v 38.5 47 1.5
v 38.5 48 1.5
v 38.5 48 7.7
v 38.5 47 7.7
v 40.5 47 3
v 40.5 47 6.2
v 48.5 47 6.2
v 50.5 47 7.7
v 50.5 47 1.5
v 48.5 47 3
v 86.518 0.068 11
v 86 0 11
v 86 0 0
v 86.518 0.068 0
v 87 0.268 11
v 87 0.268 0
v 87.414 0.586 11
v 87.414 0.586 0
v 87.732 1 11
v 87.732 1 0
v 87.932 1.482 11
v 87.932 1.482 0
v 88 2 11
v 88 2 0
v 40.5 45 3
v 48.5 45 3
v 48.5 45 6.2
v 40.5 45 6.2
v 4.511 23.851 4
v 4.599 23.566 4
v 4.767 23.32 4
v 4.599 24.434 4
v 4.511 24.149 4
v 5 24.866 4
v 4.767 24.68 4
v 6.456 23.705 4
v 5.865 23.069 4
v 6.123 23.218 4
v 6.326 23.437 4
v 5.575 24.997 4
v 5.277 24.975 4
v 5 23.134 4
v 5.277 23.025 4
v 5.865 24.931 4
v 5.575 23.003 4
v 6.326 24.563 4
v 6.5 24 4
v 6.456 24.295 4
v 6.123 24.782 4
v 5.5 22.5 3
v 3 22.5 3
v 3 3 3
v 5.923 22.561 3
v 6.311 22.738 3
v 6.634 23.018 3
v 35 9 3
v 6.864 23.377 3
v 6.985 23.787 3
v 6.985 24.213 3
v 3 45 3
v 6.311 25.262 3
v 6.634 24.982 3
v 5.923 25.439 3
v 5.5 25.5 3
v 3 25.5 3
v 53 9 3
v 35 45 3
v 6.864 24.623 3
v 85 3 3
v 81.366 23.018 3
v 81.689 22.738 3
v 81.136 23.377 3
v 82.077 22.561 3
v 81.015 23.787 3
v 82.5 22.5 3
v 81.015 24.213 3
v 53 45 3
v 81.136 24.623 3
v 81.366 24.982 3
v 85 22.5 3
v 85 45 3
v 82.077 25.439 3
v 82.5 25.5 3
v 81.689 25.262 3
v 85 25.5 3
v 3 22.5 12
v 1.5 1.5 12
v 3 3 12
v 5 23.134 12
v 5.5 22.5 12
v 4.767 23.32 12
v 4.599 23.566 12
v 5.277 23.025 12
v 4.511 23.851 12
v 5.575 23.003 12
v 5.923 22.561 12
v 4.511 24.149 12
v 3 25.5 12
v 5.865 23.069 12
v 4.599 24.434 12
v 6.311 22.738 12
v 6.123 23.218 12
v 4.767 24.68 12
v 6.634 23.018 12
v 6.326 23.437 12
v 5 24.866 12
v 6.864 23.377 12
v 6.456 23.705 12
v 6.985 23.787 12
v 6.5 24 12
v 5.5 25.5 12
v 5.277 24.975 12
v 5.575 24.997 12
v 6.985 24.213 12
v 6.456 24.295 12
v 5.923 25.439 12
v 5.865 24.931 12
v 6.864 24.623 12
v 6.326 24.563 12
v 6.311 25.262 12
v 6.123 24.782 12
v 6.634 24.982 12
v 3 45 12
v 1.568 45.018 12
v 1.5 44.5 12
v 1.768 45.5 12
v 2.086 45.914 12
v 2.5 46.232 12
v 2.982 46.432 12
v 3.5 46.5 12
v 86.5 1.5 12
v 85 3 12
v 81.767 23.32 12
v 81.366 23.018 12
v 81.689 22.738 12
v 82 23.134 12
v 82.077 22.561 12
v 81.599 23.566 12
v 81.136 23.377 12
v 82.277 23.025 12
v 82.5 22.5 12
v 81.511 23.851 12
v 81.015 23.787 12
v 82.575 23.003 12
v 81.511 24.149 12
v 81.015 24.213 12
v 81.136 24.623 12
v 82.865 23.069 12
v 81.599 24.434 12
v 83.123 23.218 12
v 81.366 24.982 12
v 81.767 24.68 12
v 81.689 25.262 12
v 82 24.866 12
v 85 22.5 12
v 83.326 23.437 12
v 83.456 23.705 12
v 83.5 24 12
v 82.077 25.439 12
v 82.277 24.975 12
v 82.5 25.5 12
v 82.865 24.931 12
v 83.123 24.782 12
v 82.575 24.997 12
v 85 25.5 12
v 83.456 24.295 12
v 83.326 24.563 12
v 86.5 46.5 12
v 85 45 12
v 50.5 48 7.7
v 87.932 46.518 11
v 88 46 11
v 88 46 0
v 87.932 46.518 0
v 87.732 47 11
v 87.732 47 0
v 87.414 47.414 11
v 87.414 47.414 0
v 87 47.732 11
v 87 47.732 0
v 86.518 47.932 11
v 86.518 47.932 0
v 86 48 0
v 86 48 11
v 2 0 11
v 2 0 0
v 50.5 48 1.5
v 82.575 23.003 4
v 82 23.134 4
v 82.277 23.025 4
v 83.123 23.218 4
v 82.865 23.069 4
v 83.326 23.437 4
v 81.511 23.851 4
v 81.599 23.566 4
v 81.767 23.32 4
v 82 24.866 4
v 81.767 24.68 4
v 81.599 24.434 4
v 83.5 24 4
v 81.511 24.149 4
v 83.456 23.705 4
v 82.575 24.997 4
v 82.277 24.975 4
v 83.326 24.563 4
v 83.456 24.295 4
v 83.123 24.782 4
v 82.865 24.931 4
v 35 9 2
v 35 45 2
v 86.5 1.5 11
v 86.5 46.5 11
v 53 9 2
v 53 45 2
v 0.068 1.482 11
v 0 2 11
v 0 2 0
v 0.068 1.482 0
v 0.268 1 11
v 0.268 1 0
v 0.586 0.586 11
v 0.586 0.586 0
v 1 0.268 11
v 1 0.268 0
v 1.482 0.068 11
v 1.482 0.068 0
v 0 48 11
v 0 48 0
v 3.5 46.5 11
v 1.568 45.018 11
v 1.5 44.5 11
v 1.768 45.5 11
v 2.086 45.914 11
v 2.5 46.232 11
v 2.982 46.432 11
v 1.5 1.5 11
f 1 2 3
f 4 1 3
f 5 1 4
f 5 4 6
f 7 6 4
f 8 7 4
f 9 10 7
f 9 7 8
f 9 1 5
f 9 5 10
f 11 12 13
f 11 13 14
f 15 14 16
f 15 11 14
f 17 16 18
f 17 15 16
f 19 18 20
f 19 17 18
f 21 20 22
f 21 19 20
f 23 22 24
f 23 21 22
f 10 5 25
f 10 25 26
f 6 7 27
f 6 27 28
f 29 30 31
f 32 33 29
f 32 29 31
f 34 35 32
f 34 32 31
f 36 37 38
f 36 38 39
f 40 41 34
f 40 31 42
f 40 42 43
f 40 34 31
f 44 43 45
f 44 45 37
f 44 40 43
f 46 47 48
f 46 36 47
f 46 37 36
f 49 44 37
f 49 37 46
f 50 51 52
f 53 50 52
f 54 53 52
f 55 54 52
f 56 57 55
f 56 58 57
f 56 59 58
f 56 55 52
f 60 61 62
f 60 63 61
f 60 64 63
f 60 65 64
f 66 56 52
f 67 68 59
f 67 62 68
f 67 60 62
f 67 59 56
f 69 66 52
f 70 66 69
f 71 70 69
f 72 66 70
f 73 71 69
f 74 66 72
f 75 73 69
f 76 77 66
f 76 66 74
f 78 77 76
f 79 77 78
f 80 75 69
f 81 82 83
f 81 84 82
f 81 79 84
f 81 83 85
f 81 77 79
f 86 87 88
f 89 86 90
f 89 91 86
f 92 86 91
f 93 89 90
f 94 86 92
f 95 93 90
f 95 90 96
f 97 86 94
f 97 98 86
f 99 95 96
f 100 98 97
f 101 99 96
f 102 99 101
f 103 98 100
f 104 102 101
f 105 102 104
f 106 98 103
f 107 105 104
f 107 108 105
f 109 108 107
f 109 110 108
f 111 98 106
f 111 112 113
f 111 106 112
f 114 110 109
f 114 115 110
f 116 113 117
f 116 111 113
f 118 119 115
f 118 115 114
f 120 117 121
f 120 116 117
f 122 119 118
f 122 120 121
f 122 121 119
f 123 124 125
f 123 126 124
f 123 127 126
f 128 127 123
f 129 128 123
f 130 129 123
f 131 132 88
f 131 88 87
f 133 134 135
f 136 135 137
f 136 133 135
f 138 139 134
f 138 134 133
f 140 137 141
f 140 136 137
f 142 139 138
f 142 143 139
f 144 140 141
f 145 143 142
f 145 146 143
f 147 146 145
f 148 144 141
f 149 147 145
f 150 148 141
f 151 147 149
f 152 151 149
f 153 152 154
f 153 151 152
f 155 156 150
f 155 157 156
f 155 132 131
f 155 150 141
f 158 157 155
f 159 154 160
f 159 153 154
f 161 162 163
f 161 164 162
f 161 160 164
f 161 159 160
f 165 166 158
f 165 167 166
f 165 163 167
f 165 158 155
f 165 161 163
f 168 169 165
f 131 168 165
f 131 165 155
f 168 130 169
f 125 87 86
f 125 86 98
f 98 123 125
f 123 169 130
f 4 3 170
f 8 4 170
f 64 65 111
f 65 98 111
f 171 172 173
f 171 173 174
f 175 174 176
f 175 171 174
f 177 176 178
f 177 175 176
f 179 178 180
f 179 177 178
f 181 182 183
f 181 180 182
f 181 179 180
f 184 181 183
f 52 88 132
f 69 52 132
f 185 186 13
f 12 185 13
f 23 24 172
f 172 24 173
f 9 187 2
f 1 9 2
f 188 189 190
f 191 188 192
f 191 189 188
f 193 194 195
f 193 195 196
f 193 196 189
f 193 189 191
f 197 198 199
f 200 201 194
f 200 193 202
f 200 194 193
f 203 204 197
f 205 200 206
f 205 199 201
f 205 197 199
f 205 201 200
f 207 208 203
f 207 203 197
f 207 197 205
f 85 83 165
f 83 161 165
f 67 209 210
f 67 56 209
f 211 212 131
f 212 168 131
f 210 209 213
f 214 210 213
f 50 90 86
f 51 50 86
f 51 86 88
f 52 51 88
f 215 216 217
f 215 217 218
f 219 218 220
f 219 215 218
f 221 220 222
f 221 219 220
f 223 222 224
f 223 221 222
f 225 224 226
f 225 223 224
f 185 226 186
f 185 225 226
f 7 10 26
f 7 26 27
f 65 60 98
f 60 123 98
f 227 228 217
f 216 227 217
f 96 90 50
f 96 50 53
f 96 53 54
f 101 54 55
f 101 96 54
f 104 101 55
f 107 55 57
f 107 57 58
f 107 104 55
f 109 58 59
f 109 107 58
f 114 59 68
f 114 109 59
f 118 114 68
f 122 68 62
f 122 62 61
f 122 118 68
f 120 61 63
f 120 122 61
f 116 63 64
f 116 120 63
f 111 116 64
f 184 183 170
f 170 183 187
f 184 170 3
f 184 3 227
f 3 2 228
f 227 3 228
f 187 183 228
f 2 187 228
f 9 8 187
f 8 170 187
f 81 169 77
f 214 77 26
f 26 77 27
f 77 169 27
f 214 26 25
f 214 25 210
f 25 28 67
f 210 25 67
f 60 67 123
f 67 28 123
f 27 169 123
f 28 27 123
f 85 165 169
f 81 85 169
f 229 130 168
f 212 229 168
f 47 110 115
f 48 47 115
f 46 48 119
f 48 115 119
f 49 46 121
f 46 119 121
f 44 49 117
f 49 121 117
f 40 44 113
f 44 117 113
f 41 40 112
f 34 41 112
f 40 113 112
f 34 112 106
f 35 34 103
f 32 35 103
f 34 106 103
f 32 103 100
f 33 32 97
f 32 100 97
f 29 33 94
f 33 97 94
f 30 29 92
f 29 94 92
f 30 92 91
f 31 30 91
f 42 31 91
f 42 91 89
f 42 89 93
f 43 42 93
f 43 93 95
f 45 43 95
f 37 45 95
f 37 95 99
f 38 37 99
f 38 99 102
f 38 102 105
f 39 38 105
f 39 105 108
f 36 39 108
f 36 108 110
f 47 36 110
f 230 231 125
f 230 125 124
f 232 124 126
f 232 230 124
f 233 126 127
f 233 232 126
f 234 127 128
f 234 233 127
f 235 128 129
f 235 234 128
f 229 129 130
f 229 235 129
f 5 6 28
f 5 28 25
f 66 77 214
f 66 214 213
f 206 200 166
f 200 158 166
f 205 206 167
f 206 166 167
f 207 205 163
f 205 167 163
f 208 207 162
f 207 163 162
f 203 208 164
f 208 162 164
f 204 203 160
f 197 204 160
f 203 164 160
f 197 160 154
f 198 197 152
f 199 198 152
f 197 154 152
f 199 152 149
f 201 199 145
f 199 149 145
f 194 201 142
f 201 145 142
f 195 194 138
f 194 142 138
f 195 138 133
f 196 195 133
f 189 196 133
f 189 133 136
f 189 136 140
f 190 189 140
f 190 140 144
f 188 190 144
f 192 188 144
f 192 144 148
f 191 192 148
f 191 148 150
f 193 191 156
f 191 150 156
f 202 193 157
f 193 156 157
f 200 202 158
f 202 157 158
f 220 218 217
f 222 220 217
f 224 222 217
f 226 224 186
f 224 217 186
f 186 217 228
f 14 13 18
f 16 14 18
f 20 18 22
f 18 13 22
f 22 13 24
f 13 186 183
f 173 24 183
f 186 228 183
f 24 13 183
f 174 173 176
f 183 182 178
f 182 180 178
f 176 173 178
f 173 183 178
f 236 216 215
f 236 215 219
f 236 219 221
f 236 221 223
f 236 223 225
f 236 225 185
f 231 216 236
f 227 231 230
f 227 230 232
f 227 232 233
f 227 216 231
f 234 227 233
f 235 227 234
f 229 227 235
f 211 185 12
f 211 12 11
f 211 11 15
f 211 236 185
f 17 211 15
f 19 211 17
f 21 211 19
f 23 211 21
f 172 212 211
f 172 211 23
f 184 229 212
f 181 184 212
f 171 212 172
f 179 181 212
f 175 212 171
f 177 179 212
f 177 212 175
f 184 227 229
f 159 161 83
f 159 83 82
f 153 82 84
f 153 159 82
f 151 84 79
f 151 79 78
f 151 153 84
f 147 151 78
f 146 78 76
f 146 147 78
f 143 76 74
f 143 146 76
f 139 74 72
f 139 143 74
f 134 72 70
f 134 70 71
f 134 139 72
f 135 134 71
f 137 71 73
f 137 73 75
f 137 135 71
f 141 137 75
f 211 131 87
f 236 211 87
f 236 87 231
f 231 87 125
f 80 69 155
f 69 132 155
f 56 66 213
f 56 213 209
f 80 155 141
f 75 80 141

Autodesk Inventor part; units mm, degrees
ref_plane "YZ Plane" through (0, 0, 0) normal (1, 0, 0) x (0, 1, 0)
ref_plane "XZ Plane" through (0, 0, 0) normal (0, 1, 0) x (-1, 0, 0)
ref_plane "XY Plane" through (0, 0, 0) normal (0, 0, 1) x (1, 0, 0)
sketch "Sketch1" plane through (0, 0, 0) normal (0, 0, 1) x (1, 0, 0)
  line L0 (0, 0) -> (88, 0)
  line L1 (88, 0) -> (88, 48)
  line L2 (88, 48) -> (0, 48)
  line L3 (0, 48) -> (0, 0)
  line L4 (18.3534, 5.6399) -> (66.0026, 5.6399)
  line L5 (66.0026, 5.6399) -> (66.0026, 36.8949)
  line L6 (66.0026, 36.8949) -> (18.3534, 36.8949)
  line L7 (18.3534, 36.8949) -> (18.3534, 5.6399)
  dimension "d0" = 88
  dimension "d1" = 48
extrude "Extrusion1" add sketch "Sketch1" along normal blind 12 contours L3 L2 L1 L0 | L7 L6 L5 L4
sketch "Sketch2" plane through (0, 0, 12) normal (0, 0, 1) x (1, 0, 0)
  line L0 (3, 3) -> (85, 3)
  line L1 (85, 3) -> (85, 45)
  line L2 (85, 45) -> (3, 45)
  line L3 (3, 45) -> (3, 3)
  line L4 (88, 48) -> (0, 48) projected
  line L5 (88, 0) -> (88, 48) projected
  line L6 (0, 0) -> (88, 0) projected
  line L7 (0, 48) -> (0, 0) projected
  dimension "d4" = 3
  dimension "d5" = 3
  dimension "d6" = 3
  dimension "d7" = 3
extrude "Extrusion2" cut sketch "Sketch2" against normal blind 9 contours L3 L2 L1 L0
sketch "Sketch3" plane through (0, 0, 12) normal (0, 0, 1) x (1, 0, 0)
  line L0 (1.5, 46.5) -> (86.5, 46.5)
  line L1 (86.5, 46.5) -> (86.5, 1.5)
  line L2 (86.5, 1.5) -> (1.5, 1.5)
  line L3 (1.5, 1.5) -> (1.5, 46.5)
  line L4 (0, 0) -> (88, 0) projected
  line L5 (0, 48) -> (0, 0) projected
  line L6 (88, 0) -> (0, 0)
  line L7 (0, 0) -> (0, 48)
  line L8 (0, 48) -> (88, 48)
  line L9 (88, 48) -> (88, 0)
  dimension "d10" = 1.5
  dimension "d11" = 1.5
  dimension "d12" = 1.5
  dimension "d13" = 1.5
extrude "Extrusion3" cut sketch "Sketch3" against normal blind 1
fillet "Fillet1" radius 2 4 edges at (0, 0, 5.5) (88, 0, 5.5) (88, 48, 5.5) (1.5, 46.5, 11.5)
sketch "Sketch4" plane through (0, 0, 12) normal (0, 0, 1) x (1, 0, 0)
  circle A0 centre (5.5, 24) radius 1
  circle A1 centre (82.5, 24) radius 1
  line L0 (3, 45) -> (85, 45) projected
  line L1 (3, 3) -> (3, 45) projected
  line L2 (3, 25.5) -> (5.5, 25.5)
  line L3 (5.5, 25.5) -> (5.5, 22.5)
  line L4 (5.5, 22.5) -> (3, 22.5)
  line L5 (3, 22.5) -> (3, 25.5)
  circle A2 centre (5.5, 24) radius 1.5
  line L6 (85, 45) -> (85, 3) projected
  line L7 (85, 22.5) -> (82.5, 22.5)
  line L8 (82.5, 22.5) -> (82.5, 25.5)
  line L9 (82.5, 25.5) -> (85, 25.5)
  line L10 (85, 25.5) -> (85, 22.5)
  circle A3 centre (82.5, 24) radius 1.5
  point P0 (0, 0)
  dimension "d17" = 2
  dimension "d18" = 2
  dimension "d19" = 21
  dimension "d20" = 21
  dimension "d21" = 2.5
  dimension "d22" = 3
  dimension "d23" = 1.5
  dimension "d24" = 2.5
  dimension "d25" = 2.5
  dimension "d26" = 3
  dimension "d27" = 1.5
extrude "Extrusion4" add sketch "Sketch4" against normal blind 10
sketch "Sketch5" plane through (0, 0, 12) normal (0, 0, 1) x (1, 0, 0)
  circle A0 centre (5.5, 24) radius 1
  circle A1 centre (82.5, 24) radius 1
  line L0 (3, 25.5) -> (3, 22.5) projected
  line L1 (3, 22.5) -> (5.5, 22.5) projected
  line L2 (82.5, 22.5) -> (85, 22.5) projected
  line L3 (85, 22.5) -> (85, 25.5) projected
  point P0 (0, 0)
  dimension "d30" = 2
  dimension "d31" = 2
  dimension "d32" = 2.5
  dimension "d33" = 1.5
  dimension "d34" = 1.5
  dimension "d35" = 2.5
extrude "Extrusion5" cut sketch "Sketch5" against normal blind 8
sketch "Sketch6" plane through (0, 0, 3) normal (0, 0, 1) x (1, 0, 0)
  line L0 (35, 45) -> (53, 45)
  line L1 (53, 45) -> (53, 9)
  line L2 (53, 9) -> (35, 9)
  line L3 (35, 9) -> (35, 45)
  line L4 (3, 45) -> (85, 45) projected
  line L5 (3, 25.5) -> (3, 45) projected
  point P0 (0, 0)
  dimension "d38" = 18
  dimension "d39" = 36
  dimension "d40" = 0
  dimension "d41" = 32
  dimension "d50" = 82
extrude "Extrusion6" cut sketch "Sketch6" against normal blind 1
sketch "Sketch7" plane through (0, 48, 11) normal (0, 1, 0) x (1, 0, 0)
  line L0 (48.5, 4.8) -> (40.5, 4.8)
  line L1 (40.5, 4.8) -> (40.5, 8)
  line L2 (40.5, 8) -> (48.5, 8)
  line L3 (48.5, 8) -> (48.5, 4.8)
  line L4 (86, 11) -> (0, 11) projected
  line L5 (86, 11) -> (86, 0) projected
  dimension "d44" = 8
  dimension "d45" = 3.2
  dimension "d46" = 3
  dimension "d47" = 37.5
extrude "Extrusion7" cut sketch "Sketch7" against normal blind 4
sketch "Sketch8" plane through (0, 48, 11) normal (0, 1, 0) x (1, 0, 0)
  line L0 (50.5, 9.5) -> (38.5, 9.5)
  line L1 (38.5, 9.5) -> (38.5, 3.3)
  line L2 (38.5, 3.3) -> (50.5, 3.3)
  line L3 (50.5, 3.3) -> (50.5, 9.5)
  line L4 (48.5, 8) -> (48.5, 4.8) projected
  line L5 (40.5, 4.8) -> (40.5, 8) projected
  line L6 (48.5, 4.8) -> (40.5, 4.8) projected
  line L7 (40.5, 8) -> (48.5, 8) projected
  point P0 (0, 11)
  dimension "d51" = 2
  dimension "d52" = 2
  dimension "d53" = 1.5
  dimension "d54" = 1.5
extrude "Extrusion8" cut sketch "Sketch8" against normal blind 1
properties part number "Base"
